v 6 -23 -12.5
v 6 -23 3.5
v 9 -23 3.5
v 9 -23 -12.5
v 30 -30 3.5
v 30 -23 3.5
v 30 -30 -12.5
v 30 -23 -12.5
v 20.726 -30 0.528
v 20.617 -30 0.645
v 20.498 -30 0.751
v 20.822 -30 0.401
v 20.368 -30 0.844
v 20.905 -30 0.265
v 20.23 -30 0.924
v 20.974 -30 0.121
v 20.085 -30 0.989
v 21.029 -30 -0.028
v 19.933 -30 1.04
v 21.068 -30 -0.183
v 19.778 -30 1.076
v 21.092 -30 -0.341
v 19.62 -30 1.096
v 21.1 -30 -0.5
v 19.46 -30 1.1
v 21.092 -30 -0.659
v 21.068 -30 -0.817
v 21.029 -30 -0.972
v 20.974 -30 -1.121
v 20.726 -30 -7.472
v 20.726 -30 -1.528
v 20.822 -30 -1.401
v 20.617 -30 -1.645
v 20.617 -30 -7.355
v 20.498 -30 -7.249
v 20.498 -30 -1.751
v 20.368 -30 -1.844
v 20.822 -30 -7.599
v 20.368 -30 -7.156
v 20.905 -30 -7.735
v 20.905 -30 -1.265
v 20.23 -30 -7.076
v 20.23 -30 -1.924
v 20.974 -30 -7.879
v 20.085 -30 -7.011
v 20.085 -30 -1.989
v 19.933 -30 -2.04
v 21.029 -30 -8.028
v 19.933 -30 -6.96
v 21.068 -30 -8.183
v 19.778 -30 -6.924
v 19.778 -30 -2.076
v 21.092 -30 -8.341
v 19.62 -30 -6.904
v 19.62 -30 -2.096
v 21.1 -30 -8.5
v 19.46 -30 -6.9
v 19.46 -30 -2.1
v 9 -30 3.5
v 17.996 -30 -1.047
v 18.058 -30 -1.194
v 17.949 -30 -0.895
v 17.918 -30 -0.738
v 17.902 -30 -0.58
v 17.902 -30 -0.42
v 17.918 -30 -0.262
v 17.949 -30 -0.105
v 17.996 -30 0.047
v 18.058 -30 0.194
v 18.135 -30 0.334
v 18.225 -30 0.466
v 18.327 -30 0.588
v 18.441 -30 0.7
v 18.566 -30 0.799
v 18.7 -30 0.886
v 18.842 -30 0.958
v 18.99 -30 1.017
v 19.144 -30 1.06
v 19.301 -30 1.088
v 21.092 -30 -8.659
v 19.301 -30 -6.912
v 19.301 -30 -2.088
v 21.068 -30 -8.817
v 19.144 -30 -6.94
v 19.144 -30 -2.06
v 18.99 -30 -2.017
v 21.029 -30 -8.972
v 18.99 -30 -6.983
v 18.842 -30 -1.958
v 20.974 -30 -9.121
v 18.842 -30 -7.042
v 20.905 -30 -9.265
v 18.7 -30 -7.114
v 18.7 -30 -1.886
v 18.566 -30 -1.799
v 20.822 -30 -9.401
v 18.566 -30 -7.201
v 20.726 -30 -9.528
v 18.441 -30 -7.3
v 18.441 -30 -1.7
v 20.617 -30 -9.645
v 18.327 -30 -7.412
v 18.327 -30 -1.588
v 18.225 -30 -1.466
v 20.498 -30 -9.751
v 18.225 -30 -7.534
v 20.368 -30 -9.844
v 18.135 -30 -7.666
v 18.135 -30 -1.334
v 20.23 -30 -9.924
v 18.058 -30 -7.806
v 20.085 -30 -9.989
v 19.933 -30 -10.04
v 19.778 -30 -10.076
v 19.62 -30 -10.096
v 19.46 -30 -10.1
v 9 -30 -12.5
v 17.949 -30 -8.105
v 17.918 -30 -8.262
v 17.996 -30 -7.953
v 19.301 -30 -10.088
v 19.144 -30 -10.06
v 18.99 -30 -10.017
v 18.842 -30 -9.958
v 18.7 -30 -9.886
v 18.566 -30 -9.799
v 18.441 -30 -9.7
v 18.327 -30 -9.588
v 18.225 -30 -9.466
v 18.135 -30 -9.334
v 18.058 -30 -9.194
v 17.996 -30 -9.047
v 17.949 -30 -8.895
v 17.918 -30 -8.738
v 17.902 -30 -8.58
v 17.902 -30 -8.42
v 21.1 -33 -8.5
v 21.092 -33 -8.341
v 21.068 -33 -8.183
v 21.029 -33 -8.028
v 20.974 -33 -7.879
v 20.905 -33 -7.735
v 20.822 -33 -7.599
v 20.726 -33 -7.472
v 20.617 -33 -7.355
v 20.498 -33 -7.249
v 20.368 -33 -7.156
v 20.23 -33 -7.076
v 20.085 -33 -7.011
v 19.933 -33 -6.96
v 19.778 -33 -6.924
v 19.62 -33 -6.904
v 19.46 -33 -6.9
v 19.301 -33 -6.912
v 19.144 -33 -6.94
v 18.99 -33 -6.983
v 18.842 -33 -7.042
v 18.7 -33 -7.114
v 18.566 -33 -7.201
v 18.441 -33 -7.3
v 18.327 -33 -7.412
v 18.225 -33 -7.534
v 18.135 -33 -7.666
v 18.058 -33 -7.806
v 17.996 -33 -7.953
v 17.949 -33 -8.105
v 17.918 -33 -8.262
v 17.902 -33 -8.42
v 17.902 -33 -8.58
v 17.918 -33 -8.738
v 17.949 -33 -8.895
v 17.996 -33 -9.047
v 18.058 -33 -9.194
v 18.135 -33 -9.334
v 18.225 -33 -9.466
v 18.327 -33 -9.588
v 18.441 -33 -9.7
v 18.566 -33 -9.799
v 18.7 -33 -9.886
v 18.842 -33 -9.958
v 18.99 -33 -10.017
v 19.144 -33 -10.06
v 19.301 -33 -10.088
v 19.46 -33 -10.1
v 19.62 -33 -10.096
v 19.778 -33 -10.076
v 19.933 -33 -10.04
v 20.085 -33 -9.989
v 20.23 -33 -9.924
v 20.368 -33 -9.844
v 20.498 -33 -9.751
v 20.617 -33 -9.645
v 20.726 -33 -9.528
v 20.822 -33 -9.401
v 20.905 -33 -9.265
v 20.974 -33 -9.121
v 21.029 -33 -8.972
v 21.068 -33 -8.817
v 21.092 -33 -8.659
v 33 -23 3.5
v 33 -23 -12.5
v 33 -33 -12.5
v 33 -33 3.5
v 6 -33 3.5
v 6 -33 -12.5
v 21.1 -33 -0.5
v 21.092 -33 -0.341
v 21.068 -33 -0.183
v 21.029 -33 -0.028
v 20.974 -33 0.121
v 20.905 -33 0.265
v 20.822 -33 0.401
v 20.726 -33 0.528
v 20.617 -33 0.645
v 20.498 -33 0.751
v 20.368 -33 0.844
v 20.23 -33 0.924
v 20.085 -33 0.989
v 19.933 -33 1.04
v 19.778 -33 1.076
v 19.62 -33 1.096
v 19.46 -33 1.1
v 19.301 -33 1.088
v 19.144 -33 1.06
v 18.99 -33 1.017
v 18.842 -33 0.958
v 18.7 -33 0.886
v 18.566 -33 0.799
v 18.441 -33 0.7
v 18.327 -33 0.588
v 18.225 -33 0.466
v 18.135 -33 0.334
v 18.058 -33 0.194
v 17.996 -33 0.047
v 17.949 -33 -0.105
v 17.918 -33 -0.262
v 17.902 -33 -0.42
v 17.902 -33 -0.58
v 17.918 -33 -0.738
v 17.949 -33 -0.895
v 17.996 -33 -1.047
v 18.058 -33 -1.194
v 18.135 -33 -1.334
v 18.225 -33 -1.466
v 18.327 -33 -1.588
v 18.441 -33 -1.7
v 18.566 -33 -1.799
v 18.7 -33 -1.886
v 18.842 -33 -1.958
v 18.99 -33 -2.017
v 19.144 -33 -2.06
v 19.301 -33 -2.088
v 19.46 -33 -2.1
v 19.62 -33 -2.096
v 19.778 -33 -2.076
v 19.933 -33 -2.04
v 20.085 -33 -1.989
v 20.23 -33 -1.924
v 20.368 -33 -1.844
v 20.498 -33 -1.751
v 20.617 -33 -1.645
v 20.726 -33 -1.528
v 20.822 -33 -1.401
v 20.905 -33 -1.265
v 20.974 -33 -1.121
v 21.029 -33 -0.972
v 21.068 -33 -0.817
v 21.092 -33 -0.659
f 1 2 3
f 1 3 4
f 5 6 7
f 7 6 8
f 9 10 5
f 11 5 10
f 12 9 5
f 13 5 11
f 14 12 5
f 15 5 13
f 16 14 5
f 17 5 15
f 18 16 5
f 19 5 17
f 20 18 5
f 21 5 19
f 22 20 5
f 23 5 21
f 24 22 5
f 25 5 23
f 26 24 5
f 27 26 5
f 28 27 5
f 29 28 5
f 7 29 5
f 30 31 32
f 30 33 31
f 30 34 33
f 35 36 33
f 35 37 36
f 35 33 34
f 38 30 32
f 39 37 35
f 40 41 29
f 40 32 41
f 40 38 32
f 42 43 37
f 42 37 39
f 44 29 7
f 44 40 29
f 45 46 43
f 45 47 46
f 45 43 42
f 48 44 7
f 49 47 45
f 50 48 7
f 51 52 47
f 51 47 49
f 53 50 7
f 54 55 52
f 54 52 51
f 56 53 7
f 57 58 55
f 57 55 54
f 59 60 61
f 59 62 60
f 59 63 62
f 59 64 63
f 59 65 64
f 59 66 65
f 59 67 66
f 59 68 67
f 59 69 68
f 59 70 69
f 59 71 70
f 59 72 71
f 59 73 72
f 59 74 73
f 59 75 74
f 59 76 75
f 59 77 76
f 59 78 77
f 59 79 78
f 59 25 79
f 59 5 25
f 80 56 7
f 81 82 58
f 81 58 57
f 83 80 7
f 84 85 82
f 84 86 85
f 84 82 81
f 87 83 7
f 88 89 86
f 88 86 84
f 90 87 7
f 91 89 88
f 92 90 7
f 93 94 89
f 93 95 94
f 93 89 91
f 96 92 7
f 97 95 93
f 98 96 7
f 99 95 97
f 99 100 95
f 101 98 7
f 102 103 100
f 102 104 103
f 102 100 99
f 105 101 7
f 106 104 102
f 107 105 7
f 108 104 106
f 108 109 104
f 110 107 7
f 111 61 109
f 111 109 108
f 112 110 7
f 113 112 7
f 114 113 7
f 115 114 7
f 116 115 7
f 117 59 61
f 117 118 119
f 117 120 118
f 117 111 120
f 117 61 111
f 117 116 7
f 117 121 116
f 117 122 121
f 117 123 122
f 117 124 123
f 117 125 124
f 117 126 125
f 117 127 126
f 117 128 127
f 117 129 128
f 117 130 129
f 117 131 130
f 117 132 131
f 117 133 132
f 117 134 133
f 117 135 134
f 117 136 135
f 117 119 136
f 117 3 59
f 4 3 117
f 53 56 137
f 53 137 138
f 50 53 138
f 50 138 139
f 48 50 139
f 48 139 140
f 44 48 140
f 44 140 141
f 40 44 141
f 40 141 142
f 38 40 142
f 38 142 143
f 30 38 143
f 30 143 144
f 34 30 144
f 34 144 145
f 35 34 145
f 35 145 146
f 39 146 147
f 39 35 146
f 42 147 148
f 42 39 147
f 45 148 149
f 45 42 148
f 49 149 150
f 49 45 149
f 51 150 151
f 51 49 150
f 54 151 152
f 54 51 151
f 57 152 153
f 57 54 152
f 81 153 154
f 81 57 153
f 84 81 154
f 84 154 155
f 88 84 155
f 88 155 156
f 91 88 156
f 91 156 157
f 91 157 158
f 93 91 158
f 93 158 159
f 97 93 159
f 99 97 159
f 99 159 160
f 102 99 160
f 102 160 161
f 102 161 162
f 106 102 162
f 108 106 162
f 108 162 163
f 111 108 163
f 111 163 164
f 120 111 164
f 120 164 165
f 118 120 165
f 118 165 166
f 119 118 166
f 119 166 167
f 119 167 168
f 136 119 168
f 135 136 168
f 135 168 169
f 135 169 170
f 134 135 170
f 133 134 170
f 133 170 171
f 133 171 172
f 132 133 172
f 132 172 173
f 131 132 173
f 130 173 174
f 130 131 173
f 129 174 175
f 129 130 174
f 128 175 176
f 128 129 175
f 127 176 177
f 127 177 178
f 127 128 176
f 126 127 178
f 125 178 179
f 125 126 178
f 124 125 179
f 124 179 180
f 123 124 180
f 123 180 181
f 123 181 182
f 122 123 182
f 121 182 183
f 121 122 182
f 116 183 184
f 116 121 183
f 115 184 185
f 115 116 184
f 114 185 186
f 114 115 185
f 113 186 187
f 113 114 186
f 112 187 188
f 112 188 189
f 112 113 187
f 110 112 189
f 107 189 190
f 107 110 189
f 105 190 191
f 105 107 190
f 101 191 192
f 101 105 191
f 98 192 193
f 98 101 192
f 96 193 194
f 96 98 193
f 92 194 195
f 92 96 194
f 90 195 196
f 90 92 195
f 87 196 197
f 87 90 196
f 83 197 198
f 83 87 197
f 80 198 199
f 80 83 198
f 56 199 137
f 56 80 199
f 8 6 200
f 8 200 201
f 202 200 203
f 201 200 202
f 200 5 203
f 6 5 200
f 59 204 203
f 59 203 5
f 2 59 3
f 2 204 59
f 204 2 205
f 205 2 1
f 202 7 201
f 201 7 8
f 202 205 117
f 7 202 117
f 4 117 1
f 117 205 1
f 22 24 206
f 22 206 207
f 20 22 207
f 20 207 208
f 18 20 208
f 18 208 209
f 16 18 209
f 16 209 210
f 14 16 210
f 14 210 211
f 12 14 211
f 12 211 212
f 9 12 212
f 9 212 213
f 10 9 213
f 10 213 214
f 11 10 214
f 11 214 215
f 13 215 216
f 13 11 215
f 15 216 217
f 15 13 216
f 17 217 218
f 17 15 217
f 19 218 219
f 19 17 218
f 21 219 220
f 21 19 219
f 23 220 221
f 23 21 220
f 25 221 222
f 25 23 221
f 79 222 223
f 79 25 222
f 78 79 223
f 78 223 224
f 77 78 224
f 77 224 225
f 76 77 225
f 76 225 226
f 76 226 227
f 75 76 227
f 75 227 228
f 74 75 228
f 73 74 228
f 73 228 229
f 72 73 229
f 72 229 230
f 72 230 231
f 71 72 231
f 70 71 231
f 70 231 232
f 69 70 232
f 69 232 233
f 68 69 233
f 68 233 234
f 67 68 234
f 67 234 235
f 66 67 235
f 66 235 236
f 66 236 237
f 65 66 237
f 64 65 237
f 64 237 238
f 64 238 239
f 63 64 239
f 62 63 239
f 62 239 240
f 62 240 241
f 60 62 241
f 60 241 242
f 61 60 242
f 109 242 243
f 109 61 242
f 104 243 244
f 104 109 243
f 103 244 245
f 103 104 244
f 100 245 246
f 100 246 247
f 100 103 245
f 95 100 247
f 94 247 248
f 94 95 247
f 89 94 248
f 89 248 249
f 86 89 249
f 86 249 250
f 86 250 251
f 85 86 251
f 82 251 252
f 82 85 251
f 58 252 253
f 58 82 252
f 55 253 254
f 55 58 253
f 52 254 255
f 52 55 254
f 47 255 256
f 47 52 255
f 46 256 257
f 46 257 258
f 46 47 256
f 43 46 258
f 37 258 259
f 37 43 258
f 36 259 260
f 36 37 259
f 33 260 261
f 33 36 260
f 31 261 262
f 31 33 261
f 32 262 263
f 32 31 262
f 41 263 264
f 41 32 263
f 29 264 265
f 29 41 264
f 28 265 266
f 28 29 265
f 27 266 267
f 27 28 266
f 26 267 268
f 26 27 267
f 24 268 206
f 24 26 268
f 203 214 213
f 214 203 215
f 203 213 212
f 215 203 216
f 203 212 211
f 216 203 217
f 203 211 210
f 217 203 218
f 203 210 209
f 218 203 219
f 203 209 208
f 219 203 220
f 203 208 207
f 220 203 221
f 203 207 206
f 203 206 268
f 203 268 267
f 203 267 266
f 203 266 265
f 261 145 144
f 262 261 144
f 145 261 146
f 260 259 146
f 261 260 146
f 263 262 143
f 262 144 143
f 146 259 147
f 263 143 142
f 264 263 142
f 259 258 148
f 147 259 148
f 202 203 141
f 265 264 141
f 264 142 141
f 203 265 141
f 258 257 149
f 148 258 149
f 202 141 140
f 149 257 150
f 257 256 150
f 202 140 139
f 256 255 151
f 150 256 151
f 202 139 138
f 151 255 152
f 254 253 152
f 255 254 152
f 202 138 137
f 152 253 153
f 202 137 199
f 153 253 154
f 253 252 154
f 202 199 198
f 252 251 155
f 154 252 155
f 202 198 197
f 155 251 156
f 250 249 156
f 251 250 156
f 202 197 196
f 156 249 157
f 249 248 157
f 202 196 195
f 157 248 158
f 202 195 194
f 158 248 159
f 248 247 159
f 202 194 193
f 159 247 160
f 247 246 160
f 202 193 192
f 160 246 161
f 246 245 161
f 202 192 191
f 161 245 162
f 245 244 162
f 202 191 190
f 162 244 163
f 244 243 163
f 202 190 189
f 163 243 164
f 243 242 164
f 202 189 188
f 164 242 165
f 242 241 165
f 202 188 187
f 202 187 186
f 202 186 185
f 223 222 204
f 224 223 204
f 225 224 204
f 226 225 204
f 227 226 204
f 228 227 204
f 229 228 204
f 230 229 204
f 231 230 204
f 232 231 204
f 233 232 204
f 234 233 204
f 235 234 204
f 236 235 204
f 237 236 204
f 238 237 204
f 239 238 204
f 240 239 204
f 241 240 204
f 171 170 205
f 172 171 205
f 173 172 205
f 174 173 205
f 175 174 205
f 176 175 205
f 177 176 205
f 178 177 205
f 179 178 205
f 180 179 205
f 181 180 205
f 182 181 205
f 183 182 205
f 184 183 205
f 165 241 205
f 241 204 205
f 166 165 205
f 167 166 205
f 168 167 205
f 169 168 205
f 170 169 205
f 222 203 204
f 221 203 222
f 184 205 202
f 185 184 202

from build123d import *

# Parameters (mm, degrees)
CYLINDER976_R          = 1.6
CYLINDER976_DEPTH      = 20
CYLINDER976_ROLL_ANGLE = 90
CYLINDER975_R          = 1.6
CYLINDER975_DEPTH      = 20
CYLINDER975_ROLL_ANGLE = 90
BOX493_W               = 16
BOX493_H               = 10
BOX493_DEPTH           = 3
BOX492_W               = 16
BOX492_H               = 10
BOX492_DEPTH           = 3
BOX491_W               = 16
BOX491_H               = 3
BOX491_DEPTH           = 21
FUSION493_PITCH_ANGLE  = 90


with BuildPart() as cylinder1038:
    # Cylinder976 → Cylinder976 (new body)
    with BuildSketch(Plane.XY):
        Circle(CYLINDER976_R)
    extrude(amount=CYLINDER976_DEPTH)


with BuildPart() as cylinder1038_1:
    # Cylinder976 roll: moved
    add(cylinder1038.part.rotate(Axis((0, 0, 0), (1, 0, 0)), CYLINDER976_ROLL_ANGLE))


with BuildPart() as cylinder1038_2:
    # Cylinder976 placement: moved
    add(cylinder1038_1.part.moved(Location((19.5, 30, 0.5))))


with BuildPart() as fusion112:
    # Cylinder975 → Cylinder975 (new body)
    with BuildSketch(Plane.XY):
        Circle(CYLINDER975_R)
    extrude(amount=CYLINDER975_DEPTH)


with BuildPart() as fusion112_1:
    # Cylinder975 roll: moved
    add(fusion112.part.rotate(Axis((0, 0, 0), (1, 0, 0)), CYLINDER975_ROLL_ANGLE))


with BuildPart() as fusion112_2:
    # Cylinder975 placement: moved
    add(fusion112_1.part.moved(Location((19.5, 30, -7.5))))

    # Fusion112: union Cylinder1038
    add(cylinder1038_2.part)


with BuildPart() as fusion112_3:
    # Fusion112 placement: moved
    add(fusion112_2.part.moved(Location((0, -43, -1))))


with BuildPart() as cube695:
    # Box493 → Box493 (new body)
    with BuildSketch(Plane(origin=(128, 50.5, -0.5), x_dir=(1, 0, 0), z_dir=(0, 0, 1))):
        with Locations((8, 5)):
            Rectangle(BOX493_W, BOX493_H)
    extrude(amount=BOX493_DEPTH)


with BuildPart() as cube694:
    # Box492 → Box492 (new body)
    with BuildSketch(Plane(origin=(128, 50.5, -24.5), x_dir=(1, 0, 0), z_dir=(0, 0, 1))):
        with Locations((8, 5)):
            Rectangle(BOX492_W, BOX492_H)
    extrude(amount=BOX492_DEPTH)


with BuildPart() as diff_box_mount_holes:
    # Box491 → Box491 (new body)
    with BuildSketch(Plane(origin=(128, 50.5, -21.5), x_dir=(1, 0, 0), z_dir=(0, 0, 1))):
        with Locations((8, 1.5)):
            Rectangle(BOX491_W, BOX491_H)
    extrude(amount=BOX491_DEPTH)

    # Fusion493: union Cube695, Cube694
    add(cube695.part)
    add(cube694.part)


with BuildPart() as diff_box_mount_holes_1:
    # Fusion493 pitch: moved
    add(diff_box_mount_holes.part.rotate(Axis((0, 0, 0), (0, 1, 0)), FUSION493_PITCH_ANGLE))


with BuildPart() as diff_box_mount_holes_2:
    # Fusion493 placement: moved
    add(diff_box_mount_holes_1.part.moved(Location((30.5, -83.5, 131.5))))

    # Cut014057: cut Fusion112
    add(fusion112_3.part, mode=Mode.SUBTRACT)


solid = diff_box_mount_holes_2.part
